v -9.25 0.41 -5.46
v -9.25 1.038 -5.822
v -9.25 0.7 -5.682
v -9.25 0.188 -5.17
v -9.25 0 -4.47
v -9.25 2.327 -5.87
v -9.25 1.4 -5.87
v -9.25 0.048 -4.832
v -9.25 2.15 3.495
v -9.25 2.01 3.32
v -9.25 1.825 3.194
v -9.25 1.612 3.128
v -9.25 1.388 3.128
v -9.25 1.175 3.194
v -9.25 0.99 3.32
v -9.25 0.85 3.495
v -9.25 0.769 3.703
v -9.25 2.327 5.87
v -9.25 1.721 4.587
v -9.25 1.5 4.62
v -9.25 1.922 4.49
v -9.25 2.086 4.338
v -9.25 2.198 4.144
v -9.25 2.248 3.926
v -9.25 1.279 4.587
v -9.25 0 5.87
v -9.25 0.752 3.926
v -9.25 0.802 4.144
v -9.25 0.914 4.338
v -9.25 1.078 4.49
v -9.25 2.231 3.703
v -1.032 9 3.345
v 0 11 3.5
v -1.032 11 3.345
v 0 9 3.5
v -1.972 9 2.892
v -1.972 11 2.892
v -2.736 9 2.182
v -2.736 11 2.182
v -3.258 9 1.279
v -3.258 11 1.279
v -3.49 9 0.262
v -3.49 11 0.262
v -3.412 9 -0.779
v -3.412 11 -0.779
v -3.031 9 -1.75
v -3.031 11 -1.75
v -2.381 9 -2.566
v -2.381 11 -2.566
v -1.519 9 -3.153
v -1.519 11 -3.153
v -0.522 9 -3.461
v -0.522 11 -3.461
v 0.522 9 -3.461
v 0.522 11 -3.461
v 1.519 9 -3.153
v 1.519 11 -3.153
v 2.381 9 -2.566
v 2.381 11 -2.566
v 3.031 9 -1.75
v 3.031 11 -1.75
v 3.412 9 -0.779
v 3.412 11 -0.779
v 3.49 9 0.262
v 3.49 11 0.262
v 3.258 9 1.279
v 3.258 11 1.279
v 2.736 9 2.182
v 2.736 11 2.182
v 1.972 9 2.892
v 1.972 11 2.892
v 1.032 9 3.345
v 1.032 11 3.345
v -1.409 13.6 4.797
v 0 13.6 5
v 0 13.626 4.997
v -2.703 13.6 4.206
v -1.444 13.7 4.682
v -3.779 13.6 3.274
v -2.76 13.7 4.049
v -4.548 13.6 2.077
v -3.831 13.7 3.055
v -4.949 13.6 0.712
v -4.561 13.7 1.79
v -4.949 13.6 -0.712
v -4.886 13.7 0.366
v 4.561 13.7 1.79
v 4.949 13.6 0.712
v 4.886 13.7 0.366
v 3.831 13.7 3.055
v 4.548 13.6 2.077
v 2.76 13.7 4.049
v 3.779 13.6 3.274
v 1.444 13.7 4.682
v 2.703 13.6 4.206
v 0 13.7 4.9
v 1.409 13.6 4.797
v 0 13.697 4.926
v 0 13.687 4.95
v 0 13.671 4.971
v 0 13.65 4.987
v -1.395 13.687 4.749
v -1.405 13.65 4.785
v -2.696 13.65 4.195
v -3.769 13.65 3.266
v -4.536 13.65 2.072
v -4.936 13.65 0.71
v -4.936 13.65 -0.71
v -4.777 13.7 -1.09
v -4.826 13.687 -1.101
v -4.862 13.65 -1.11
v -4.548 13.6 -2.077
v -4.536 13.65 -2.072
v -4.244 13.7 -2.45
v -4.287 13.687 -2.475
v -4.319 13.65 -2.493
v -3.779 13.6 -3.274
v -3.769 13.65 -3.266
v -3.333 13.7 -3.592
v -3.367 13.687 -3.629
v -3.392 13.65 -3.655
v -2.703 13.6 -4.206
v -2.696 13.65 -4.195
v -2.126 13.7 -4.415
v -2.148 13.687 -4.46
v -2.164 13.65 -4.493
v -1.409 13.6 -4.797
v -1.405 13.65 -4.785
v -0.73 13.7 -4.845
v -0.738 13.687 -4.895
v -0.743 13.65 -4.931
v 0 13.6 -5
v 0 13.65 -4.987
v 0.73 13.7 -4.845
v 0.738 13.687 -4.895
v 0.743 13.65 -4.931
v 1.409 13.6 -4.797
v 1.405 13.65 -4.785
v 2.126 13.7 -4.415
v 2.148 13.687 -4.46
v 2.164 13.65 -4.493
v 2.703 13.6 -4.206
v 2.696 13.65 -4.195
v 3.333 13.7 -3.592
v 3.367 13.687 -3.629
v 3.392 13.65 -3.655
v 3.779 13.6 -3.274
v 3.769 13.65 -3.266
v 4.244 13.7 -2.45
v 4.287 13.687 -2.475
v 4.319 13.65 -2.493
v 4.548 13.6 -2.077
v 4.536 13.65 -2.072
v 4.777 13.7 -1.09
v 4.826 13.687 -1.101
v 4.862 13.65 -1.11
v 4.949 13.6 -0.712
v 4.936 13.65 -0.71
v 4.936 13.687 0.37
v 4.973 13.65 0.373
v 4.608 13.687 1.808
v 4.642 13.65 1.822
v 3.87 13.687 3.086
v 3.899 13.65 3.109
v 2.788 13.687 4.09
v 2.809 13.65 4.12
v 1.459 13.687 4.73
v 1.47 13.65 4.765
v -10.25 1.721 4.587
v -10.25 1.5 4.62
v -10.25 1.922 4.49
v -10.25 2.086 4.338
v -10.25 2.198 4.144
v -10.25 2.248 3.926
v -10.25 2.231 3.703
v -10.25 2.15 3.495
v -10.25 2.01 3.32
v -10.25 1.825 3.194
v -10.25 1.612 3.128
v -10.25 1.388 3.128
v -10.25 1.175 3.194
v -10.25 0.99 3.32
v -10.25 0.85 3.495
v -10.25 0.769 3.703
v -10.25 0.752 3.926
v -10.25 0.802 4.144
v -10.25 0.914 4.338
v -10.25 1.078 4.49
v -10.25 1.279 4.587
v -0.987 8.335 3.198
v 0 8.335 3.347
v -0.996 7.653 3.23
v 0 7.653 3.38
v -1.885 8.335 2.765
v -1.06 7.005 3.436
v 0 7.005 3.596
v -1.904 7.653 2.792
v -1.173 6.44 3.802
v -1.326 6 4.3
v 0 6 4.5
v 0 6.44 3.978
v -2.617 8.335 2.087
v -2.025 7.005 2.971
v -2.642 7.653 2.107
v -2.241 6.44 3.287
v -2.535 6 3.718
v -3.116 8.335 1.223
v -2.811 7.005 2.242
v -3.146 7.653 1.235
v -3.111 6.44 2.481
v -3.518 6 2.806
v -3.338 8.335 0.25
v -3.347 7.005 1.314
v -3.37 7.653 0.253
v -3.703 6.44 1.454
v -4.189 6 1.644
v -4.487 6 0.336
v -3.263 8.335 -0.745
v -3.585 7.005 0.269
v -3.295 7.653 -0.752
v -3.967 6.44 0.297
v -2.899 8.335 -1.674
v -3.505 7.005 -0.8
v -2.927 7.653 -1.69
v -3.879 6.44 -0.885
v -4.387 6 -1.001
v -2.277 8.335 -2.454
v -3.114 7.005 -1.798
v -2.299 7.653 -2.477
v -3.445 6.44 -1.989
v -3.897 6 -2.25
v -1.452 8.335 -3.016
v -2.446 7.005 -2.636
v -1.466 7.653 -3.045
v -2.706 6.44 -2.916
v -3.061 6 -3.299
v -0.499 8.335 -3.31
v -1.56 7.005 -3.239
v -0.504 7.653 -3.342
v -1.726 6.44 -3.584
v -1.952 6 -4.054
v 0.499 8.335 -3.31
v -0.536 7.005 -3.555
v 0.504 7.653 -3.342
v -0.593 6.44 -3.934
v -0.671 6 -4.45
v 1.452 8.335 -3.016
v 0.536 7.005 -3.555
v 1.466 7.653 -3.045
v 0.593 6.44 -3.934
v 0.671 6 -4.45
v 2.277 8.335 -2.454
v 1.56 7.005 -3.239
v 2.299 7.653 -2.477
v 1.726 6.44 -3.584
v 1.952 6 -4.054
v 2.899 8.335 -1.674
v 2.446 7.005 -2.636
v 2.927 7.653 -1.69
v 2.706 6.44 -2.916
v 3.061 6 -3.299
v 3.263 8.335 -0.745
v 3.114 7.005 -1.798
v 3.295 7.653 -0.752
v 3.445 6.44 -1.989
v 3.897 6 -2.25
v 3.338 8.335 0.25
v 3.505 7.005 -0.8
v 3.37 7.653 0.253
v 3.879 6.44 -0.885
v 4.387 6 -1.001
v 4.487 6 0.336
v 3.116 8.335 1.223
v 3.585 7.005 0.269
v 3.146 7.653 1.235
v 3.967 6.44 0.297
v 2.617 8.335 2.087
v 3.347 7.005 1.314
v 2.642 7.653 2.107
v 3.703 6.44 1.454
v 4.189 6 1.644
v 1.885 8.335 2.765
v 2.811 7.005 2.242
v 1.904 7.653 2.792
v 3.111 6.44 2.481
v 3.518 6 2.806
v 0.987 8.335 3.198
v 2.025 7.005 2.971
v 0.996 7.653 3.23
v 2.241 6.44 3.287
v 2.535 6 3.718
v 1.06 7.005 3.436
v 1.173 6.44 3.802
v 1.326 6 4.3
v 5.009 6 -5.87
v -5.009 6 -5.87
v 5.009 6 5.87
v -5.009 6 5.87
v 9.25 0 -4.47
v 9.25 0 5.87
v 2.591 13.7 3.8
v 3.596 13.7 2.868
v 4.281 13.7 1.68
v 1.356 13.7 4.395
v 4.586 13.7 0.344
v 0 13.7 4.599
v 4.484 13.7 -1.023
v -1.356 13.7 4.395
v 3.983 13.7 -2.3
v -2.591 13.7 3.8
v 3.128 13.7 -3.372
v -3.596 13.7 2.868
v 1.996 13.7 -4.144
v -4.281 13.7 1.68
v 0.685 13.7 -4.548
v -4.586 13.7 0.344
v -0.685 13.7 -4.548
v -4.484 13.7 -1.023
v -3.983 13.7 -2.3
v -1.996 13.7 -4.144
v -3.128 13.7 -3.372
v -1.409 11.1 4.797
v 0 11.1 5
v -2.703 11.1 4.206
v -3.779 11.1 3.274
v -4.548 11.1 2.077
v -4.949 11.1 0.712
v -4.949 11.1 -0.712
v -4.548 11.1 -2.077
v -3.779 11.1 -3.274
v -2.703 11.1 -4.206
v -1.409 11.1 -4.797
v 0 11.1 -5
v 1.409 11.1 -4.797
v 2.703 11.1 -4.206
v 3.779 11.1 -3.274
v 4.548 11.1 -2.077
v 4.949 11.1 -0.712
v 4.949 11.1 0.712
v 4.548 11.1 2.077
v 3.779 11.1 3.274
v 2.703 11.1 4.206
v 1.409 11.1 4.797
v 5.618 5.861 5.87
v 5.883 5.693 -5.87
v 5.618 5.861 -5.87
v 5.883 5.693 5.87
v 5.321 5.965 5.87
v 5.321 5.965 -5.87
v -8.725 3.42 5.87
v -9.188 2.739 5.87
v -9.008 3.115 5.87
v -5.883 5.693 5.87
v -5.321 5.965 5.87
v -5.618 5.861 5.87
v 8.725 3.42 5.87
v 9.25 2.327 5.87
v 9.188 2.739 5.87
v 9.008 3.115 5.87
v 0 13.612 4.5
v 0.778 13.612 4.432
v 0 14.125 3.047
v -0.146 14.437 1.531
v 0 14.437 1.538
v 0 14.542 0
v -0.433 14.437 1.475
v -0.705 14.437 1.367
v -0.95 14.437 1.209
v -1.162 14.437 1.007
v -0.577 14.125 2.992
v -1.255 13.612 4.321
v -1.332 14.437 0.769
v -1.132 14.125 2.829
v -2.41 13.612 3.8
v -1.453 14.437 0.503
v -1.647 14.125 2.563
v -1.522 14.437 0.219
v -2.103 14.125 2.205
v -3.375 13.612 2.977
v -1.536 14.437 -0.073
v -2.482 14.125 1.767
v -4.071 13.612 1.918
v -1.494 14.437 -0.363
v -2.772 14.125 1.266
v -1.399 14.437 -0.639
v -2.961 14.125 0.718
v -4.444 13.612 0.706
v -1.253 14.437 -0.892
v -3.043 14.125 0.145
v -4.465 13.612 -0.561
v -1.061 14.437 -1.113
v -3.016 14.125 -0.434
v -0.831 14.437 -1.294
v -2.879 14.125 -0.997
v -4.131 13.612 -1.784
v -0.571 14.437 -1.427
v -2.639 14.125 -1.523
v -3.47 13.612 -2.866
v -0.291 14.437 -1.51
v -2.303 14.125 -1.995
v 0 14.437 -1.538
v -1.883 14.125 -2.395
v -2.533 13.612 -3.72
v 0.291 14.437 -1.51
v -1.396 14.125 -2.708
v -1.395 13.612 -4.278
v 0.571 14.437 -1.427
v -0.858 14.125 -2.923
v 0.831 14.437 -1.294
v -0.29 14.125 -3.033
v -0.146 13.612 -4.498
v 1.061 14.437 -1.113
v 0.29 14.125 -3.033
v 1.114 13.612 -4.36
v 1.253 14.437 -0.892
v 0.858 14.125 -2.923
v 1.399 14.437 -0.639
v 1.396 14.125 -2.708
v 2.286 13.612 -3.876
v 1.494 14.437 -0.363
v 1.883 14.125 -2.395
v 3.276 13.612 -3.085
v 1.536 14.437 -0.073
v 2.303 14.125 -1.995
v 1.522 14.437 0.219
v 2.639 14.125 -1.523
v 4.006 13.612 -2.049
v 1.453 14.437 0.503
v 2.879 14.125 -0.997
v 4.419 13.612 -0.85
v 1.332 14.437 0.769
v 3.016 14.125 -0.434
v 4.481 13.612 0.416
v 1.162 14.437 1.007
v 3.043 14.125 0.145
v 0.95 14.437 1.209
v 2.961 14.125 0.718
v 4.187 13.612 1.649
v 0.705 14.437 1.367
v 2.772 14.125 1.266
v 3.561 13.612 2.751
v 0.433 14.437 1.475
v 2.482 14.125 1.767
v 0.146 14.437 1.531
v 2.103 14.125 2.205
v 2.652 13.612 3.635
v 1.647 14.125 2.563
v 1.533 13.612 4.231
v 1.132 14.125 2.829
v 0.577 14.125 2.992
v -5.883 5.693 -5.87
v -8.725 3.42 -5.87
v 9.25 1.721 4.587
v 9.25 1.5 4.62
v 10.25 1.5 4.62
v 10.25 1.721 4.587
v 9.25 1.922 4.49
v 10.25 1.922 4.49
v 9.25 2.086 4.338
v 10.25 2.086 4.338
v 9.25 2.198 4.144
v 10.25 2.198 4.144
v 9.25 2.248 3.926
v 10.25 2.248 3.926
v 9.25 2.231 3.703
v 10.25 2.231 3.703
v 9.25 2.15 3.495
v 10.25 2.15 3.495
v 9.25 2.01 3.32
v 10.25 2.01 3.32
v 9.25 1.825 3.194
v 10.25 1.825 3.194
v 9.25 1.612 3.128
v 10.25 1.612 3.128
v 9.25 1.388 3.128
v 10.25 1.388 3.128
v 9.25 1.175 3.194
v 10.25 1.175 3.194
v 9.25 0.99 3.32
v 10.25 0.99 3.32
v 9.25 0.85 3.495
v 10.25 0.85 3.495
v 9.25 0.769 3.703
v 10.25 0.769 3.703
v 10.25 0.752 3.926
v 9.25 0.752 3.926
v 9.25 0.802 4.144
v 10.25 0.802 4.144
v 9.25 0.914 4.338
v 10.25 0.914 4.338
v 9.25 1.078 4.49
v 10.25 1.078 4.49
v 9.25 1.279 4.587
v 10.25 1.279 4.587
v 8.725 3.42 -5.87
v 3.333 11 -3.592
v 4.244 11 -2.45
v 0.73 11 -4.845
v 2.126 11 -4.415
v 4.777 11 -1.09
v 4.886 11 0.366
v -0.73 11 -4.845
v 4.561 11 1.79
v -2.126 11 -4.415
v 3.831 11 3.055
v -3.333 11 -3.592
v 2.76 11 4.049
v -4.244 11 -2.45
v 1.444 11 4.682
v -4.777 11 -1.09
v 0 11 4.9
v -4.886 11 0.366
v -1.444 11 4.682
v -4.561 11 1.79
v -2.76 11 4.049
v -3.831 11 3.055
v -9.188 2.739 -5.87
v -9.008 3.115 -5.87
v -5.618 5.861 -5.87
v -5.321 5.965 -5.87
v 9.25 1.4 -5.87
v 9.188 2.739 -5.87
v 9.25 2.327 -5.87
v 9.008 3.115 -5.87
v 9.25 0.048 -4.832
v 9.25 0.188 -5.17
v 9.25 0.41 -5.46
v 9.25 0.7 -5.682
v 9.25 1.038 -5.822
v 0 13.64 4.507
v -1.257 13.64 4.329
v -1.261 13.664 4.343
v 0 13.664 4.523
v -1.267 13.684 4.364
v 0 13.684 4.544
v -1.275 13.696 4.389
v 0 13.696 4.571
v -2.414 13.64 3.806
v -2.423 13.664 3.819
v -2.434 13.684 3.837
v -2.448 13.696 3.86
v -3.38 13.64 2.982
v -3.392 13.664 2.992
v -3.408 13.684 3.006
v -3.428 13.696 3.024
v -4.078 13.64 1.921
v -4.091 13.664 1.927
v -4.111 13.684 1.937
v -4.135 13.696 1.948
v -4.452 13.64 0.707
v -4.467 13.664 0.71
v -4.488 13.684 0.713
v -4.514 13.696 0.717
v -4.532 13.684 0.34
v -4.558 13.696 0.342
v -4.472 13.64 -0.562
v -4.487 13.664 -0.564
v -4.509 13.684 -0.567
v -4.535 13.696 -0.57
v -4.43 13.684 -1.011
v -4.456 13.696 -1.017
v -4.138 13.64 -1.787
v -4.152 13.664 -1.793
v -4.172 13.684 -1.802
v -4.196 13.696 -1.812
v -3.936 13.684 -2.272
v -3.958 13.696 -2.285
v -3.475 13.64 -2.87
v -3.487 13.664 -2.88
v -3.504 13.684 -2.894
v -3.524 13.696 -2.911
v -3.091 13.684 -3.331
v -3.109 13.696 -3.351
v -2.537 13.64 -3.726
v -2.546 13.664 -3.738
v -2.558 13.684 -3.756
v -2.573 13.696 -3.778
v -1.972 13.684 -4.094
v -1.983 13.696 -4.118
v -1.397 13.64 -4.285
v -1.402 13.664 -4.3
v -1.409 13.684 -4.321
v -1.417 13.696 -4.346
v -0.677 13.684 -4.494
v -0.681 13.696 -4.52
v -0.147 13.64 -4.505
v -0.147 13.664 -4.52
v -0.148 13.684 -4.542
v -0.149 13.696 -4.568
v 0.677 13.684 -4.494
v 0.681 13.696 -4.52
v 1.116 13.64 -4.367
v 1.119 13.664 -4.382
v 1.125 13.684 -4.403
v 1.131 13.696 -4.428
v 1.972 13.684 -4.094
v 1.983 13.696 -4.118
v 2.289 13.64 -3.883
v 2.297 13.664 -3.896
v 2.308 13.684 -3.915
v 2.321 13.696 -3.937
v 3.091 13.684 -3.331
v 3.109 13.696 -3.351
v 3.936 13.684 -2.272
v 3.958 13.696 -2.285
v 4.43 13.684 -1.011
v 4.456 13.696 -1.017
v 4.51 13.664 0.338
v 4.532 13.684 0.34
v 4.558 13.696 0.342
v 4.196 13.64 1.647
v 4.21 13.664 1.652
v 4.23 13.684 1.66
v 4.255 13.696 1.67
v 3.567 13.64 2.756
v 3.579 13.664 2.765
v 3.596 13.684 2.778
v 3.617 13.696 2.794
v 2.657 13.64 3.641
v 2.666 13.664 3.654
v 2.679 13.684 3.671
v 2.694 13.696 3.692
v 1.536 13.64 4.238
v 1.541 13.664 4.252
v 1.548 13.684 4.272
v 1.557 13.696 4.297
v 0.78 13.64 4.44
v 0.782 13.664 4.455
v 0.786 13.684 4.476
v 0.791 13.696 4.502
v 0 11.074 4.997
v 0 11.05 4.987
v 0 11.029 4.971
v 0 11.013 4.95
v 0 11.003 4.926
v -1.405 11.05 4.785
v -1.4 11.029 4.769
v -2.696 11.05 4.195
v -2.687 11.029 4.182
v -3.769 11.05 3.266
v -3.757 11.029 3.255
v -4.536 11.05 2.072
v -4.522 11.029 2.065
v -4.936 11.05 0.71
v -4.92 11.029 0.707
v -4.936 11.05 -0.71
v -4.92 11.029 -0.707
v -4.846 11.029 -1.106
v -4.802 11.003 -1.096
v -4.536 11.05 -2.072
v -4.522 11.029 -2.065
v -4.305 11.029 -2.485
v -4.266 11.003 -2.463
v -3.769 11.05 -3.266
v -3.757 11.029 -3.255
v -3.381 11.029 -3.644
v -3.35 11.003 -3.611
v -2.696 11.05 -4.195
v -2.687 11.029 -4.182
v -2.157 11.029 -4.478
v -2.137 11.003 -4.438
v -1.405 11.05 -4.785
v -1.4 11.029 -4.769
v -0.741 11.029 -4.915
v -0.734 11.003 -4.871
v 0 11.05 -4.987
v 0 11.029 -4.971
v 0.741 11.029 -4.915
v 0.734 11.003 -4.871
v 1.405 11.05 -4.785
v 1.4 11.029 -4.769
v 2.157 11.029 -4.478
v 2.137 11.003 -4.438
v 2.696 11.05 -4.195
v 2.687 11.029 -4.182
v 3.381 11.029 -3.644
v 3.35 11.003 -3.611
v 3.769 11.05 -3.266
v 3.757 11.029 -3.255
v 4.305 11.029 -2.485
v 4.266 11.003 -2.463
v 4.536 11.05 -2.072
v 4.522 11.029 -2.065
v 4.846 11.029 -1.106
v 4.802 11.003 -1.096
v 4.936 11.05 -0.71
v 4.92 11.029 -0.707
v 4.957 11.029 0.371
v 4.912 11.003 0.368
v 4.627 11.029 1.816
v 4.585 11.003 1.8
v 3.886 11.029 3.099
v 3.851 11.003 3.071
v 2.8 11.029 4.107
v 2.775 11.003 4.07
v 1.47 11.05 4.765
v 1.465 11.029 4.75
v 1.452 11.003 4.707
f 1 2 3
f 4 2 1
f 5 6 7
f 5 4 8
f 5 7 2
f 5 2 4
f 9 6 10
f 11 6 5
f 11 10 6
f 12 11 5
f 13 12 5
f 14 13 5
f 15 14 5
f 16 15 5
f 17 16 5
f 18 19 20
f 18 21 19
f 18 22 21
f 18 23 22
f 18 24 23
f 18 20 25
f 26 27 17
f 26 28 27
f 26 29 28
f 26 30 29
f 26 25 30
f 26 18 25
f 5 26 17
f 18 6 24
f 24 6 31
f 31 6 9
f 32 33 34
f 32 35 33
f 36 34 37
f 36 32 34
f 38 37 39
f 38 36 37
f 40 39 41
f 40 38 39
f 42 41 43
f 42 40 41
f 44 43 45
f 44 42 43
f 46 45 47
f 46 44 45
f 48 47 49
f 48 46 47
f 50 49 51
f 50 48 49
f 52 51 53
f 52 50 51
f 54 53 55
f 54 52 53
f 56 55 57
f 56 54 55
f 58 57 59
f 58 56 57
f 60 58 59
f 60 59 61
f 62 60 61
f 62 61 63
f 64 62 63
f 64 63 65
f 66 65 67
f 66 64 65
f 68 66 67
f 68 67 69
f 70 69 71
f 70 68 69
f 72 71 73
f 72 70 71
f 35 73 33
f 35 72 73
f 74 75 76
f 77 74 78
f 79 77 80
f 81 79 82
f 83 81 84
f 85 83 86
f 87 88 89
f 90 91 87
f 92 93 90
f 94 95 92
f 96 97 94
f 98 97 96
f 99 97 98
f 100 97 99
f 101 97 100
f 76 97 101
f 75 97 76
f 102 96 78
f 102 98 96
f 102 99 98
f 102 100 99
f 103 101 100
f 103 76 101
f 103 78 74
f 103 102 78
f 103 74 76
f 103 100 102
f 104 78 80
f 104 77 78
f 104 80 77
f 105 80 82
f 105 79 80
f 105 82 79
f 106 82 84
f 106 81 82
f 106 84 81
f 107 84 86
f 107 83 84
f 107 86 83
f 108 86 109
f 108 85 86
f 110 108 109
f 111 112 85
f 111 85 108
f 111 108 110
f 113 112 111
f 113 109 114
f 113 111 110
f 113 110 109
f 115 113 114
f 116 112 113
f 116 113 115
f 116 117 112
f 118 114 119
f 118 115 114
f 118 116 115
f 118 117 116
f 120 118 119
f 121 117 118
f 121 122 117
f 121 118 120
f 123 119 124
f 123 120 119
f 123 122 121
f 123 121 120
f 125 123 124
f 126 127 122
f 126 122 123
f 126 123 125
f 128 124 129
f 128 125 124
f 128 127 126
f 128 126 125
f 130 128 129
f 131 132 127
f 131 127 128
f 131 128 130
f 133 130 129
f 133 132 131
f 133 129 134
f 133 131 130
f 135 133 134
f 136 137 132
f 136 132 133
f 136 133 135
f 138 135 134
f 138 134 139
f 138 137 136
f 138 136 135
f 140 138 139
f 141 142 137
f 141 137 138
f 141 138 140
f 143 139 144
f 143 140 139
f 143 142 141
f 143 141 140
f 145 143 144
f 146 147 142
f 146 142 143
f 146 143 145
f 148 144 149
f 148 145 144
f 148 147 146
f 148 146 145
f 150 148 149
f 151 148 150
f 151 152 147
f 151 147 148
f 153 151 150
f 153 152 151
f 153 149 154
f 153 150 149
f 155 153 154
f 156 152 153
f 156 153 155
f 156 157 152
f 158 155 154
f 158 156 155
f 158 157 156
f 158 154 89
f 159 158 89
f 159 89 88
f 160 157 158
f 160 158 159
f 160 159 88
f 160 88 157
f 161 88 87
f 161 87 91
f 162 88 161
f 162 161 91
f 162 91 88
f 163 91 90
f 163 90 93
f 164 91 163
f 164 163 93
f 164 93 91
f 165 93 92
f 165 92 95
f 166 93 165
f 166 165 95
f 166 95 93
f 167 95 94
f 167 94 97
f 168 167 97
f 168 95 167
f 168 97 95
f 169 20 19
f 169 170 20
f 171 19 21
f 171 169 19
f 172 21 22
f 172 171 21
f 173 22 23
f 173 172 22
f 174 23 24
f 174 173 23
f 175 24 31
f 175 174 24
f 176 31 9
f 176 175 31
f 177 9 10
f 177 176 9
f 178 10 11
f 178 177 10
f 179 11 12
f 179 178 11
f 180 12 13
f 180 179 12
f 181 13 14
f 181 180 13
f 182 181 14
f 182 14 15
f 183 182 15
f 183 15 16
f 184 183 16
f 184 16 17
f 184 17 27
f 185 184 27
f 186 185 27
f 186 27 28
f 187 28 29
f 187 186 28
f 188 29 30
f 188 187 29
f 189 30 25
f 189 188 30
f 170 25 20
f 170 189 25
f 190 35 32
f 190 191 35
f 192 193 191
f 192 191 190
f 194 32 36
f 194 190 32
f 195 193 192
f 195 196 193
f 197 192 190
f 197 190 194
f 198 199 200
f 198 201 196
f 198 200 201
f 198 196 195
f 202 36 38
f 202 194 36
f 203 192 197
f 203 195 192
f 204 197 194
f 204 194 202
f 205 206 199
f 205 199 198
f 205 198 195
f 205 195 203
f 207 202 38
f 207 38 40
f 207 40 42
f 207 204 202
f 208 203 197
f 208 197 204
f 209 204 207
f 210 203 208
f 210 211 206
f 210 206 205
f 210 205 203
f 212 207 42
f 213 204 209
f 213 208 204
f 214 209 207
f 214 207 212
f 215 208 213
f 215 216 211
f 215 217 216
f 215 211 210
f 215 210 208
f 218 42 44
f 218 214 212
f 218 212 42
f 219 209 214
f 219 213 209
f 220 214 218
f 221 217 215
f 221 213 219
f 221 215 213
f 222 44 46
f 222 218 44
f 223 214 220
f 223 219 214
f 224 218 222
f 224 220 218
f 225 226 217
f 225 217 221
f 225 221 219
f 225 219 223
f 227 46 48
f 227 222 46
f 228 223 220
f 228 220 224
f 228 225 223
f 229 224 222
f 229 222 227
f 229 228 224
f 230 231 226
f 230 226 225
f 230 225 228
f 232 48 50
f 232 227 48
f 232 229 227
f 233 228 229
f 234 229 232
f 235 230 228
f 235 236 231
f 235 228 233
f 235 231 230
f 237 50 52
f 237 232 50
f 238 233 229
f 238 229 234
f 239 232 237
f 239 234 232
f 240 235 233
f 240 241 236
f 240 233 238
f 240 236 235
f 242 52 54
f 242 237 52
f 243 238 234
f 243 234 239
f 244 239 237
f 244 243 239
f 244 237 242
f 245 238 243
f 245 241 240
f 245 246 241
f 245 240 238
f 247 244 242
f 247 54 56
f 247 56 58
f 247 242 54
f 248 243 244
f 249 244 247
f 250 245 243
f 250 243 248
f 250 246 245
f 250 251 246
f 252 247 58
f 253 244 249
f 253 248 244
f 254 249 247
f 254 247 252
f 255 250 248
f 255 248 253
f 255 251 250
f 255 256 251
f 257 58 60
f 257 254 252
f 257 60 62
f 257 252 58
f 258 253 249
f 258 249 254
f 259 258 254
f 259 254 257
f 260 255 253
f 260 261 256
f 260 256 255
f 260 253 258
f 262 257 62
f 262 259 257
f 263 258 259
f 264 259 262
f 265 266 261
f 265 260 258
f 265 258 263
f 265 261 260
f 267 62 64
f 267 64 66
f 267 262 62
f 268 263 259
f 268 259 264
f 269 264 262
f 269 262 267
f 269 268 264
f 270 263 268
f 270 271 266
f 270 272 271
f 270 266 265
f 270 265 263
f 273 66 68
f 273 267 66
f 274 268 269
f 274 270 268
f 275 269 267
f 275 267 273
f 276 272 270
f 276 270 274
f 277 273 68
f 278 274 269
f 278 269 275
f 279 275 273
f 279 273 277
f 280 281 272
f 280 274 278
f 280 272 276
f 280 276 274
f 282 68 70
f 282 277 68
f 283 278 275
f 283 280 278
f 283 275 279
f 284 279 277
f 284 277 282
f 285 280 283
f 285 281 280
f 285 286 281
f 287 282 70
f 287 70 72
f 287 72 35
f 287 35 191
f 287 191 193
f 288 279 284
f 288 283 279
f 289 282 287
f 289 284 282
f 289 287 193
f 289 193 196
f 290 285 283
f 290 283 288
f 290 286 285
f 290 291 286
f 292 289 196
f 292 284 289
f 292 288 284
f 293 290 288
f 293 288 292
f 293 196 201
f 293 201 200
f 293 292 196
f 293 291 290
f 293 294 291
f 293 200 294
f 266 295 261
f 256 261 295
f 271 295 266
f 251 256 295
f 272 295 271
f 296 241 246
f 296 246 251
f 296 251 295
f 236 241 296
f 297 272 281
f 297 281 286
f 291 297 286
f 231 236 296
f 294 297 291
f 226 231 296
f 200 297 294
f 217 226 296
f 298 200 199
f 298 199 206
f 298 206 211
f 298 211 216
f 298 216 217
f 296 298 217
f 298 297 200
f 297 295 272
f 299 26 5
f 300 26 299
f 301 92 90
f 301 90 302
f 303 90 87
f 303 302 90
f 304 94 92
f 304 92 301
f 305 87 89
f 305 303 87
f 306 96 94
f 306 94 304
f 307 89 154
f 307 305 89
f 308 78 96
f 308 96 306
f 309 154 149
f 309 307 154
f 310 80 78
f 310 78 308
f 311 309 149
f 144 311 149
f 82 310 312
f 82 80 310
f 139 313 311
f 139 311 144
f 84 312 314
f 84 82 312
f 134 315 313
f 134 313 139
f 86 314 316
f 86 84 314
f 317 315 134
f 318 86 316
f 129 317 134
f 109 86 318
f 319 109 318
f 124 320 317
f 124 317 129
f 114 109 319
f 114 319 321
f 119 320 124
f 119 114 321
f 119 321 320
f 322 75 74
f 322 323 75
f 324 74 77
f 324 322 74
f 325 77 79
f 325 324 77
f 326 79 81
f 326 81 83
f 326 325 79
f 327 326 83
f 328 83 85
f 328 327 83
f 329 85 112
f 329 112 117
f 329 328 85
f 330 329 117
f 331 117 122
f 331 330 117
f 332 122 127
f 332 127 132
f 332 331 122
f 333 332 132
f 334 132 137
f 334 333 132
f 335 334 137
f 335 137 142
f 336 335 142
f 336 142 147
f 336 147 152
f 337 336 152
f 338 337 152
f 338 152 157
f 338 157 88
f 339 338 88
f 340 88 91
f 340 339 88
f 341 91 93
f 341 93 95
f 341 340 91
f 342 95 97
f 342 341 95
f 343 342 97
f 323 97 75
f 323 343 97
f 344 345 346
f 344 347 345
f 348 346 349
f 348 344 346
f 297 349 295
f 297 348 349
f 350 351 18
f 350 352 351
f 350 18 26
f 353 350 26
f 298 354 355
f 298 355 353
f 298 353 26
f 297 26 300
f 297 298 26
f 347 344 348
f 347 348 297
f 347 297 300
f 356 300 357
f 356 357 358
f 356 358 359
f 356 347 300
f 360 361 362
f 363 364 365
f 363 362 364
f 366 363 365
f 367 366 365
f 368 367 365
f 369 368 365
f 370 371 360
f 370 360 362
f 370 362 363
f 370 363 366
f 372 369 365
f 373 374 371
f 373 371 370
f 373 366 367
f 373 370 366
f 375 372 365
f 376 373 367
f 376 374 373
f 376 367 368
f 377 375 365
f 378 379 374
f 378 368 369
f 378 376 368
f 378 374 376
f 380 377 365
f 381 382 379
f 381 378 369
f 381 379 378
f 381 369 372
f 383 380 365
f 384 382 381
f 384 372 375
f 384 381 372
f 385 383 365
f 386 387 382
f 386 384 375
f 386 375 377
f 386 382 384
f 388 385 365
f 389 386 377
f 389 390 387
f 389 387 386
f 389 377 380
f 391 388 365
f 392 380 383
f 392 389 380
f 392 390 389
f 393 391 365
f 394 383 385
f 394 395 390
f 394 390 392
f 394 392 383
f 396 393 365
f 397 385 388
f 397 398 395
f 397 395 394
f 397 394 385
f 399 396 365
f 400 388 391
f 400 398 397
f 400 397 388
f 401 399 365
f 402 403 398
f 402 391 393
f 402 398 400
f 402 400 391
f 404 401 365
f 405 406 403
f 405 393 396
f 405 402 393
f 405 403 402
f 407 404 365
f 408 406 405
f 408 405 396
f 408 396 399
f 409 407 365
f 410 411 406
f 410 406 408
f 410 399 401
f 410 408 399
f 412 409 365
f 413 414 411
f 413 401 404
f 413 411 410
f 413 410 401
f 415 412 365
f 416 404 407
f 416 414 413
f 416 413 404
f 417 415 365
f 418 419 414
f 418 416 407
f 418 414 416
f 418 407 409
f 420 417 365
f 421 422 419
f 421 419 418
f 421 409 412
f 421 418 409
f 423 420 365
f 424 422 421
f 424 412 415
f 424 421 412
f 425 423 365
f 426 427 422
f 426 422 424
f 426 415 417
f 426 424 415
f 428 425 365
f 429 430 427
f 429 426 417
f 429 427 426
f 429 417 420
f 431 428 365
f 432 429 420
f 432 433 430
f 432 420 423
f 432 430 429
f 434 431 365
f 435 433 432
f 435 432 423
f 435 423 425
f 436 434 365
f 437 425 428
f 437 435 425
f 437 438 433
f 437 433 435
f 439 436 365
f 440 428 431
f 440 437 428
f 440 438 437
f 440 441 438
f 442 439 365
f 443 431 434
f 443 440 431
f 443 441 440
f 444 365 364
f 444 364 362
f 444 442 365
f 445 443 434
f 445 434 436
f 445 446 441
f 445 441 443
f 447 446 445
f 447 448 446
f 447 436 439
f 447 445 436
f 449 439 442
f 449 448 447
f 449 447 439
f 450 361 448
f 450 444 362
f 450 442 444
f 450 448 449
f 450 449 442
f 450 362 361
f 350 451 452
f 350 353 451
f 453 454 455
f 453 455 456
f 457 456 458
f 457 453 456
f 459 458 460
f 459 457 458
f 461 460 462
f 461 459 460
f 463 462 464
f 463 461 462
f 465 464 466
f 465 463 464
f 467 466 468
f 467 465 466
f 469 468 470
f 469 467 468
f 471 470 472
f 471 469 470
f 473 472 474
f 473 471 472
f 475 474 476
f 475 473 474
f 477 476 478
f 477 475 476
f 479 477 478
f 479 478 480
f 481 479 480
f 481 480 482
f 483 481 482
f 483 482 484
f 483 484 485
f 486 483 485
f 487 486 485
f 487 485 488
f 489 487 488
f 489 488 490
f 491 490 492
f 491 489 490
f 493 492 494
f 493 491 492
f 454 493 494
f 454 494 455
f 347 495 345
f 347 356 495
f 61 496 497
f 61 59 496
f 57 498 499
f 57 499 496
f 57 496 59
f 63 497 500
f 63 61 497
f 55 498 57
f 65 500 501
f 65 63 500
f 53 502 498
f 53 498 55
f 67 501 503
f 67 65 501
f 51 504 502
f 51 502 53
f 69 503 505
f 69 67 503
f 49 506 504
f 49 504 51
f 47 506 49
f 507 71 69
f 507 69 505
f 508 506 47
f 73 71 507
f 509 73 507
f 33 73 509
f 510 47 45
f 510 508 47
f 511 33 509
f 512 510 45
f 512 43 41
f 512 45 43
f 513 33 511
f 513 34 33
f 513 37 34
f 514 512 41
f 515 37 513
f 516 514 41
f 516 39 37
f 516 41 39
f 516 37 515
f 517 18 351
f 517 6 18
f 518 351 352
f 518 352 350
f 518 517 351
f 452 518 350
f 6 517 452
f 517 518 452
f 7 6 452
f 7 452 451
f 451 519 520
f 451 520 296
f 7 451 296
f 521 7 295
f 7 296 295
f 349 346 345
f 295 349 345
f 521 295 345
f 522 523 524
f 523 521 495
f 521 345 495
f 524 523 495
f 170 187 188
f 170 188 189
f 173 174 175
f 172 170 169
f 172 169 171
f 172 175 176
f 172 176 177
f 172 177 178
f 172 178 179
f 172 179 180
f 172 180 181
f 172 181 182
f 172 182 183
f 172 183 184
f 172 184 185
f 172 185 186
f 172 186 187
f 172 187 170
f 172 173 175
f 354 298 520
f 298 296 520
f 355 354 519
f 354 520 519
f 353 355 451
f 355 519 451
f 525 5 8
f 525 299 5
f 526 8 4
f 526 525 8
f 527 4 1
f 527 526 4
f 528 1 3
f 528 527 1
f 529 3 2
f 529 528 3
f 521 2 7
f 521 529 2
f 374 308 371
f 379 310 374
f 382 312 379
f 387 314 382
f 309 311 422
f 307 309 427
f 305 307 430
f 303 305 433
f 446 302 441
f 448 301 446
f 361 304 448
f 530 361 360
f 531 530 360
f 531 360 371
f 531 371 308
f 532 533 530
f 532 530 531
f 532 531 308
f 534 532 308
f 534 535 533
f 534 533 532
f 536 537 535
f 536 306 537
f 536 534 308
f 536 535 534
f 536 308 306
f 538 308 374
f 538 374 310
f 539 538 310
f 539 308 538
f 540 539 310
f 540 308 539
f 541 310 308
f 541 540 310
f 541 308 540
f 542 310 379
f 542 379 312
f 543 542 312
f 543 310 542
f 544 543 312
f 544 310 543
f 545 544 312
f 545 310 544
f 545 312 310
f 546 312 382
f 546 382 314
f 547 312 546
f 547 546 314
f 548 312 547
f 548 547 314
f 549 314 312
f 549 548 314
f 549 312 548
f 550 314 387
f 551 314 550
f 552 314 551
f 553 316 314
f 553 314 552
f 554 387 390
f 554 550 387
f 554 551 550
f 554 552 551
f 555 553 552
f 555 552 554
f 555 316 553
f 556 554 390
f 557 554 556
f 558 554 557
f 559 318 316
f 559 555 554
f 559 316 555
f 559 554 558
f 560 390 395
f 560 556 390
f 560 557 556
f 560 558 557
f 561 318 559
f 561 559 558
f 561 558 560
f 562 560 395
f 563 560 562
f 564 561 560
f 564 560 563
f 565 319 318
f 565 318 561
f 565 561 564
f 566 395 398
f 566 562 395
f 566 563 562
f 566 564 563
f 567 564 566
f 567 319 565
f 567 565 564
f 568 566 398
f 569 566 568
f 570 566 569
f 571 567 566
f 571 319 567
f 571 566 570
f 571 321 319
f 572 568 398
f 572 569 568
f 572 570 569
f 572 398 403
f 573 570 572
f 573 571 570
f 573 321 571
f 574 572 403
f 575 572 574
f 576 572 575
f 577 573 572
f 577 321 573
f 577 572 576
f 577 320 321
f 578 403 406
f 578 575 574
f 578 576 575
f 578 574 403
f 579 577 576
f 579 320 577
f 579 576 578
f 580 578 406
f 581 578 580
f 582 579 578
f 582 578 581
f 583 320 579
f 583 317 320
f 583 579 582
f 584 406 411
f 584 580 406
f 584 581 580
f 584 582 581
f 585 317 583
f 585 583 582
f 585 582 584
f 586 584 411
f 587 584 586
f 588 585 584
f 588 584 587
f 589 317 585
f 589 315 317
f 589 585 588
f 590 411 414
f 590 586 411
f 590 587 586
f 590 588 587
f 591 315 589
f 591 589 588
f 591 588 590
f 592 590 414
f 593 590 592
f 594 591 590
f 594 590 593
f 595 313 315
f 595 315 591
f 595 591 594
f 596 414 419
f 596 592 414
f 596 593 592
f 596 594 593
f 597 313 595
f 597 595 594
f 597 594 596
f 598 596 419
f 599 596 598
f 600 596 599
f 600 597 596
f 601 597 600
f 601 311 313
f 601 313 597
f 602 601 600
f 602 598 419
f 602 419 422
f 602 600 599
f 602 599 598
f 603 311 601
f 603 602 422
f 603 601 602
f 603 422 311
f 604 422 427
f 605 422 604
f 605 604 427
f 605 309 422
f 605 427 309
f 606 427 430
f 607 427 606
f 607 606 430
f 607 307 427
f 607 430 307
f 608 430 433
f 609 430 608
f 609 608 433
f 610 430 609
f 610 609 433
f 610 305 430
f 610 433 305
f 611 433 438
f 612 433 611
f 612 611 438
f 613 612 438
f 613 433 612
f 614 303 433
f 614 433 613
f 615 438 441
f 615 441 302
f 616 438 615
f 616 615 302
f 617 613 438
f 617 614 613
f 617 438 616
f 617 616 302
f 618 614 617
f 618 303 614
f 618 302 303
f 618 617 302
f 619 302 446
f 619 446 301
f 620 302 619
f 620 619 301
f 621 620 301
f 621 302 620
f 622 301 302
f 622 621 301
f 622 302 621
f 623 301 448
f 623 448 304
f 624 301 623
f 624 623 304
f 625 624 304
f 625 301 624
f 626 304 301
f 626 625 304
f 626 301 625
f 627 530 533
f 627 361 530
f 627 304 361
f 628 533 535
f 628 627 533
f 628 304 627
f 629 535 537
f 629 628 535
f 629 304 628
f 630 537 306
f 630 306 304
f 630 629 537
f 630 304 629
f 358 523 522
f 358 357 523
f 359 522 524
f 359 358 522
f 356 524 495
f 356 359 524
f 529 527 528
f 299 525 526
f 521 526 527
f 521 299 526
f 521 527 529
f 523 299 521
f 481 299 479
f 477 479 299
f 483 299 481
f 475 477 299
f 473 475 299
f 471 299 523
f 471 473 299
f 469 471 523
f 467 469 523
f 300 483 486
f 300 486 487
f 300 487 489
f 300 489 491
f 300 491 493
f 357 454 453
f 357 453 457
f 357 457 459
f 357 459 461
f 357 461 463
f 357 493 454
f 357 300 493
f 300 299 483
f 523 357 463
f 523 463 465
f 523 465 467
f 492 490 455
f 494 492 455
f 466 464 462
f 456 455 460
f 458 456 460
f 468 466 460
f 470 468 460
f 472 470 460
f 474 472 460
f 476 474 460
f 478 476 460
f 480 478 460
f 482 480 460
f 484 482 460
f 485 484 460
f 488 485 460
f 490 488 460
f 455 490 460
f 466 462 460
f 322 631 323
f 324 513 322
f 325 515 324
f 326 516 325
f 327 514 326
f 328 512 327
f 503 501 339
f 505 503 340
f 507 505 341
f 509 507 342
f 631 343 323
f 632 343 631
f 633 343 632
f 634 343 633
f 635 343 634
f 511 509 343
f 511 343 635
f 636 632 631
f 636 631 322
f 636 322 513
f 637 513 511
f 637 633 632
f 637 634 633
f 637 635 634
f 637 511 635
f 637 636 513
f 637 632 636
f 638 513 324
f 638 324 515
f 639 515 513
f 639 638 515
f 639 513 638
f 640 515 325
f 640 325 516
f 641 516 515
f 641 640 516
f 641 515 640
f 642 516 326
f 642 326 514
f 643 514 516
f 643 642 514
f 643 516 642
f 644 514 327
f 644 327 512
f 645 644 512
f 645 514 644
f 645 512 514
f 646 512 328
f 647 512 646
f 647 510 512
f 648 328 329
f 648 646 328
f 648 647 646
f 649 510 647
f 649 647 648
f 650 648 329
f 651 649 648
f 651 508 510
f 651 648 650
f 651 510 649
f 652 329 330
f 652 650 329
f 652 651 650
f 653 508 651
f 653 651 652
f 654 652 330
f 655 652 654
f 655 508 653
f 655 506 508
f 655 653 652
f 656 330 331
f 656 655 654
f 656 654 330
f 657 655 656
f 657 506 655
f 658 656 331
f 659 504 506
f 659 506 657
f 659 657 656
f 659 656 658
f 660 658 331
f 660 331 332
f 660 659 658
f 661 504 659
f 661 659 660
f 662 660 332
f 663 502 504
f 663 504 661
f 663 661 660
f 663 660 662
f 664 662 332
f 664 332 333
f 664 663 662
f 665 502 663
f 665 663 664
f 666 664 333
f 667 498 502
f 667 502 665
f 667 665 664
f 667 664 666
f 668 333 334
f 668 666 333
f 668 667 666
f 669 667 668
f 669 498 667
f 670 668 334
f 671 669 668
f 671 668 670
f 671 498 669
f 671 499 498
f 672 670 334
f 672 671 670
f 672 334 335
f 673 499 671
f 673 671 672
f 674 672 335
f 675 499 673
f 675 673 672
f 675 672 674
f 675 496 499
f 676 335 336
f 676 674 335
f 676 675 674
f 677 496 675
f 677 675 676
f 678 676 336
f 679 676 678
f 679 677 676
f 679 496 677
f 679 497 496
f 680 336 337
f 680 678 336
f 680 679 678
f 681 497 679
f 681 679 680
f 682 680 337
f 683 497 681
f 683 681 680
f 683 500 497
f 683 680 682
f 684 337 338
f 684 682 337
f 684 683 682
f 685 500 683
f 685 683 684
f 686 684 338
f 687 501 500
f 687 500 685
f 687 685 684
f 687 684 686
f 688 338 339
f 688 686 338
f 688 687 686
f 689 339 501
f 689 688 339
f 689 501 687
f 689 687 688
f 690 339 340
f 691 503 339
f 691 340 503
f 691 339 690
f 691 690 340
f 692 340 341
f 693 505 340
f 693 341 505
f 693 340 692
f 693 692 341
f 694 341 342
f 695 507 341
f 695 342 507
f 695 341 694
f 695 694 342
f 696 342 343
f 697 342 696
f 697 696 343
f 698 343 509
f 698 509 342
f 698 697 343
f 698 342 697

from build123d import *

# Parameters (mm, degrees)
BOSS_EXTRUDE1_DEPTH = 5.87
SKETCH6_R           = 0.75
BOSS_EXTRUDE2_DEPTH = 10.25
FILLET1_R           = 0.1
FILLET2_R           = 1.4
FILLET3_R           = 1.4


with BuildPart() as part:
    # Sketch1 → Boss-Extrude1 (new, symmetric)
    with BuildSketch(Plane.XY):
        Polygon((-9.25, 0), (9.25, 0), (9.25, 3), (5.5, 6), (-5.5, 6), (-9.25, 3), align=None)
    extrude(amount=BOSS_EXTRUDE1_DEPTH, both=True)

    # Sketch2 → Revolve5 (revolve)
    with BuildSketch(Plane.XY, mode=Mode.PRIVATE) as revolve5_sk:
        with BuildLine():
            ThreePointArc((3.5, 9), (3.465409062, 7.321803021), (4.5, 6))
            Line((4.5, 6), (0, 6))
            Line((0, 6), (0, 13.5))
            Line((0, 13.5), (4.5, 13.5))
            Line((4.5, 13.5), (4.5, 13.7))
            Line((4.5, 13.7), (5, 13.7))
            Line((5, 13.7), (5, 11))
            Line((5, 11), (3.5, 11))
            Line((3.5, 11), (3.5, 9))
        make_face()
    revolve(revolve5_sk.sketch.rotate(Axis((0, 13.5, 0), (0, -1, 0)), 90), axis=Axis((0, 13.5, 0), (0, -1, 0)))

    # Sketch3 → Revolve6 (revolve)
    with BuildSketch(Plane.XY, mode=Mode.PRIVATE) as revolve6_sk:
        with BuildLine():
            Line((0, 13.5), (0, 14.541750876))
            ThreePointArc((0, 14.541750876), (2.431447351, 14.278254553), (4.75, 13.5))
            Line((4.75, 13.5), (0, 13.5))
        make_face()
    revolve(revolve6_sk.sketch.rotate(Axis((0, 20.298095722, 0), (0, -1, 0)), 90), axis=Axis((0, 20.298095722, 0), (0, -1, 0)))

    # Sketch6 → Boss-Extrude2 (add, symmetric)
    with BuildSketch(Plane.ZY):
        with Locations((3.87, 1.5)):
            Circle(SKETCH6_R)
    extrude(amount=BOSS_EXTRUDE2_DEPTH, both=True)

    # Fillet1
    # the kernel refuses this fillet: 0.1 mm, written as the material it takes off along each edge
    with BuildSketch(Plane(origin=(0, 11, 0), x_dir=(0, 0, 1), z_dir=(1, 0, 0))) as fillet1_piece_1:
        with BuildLine():
            CenterArc((5 - FILLET1_R, -FILLET1_R), FILLET1_R, 0, 90)
            Line((5, -FILLET1_R), (5, 0))
            Line((5, 0), (5 - FILLET1_R, 0))
        make_face()
    revolve(axis=Axis((0, 11, 0), (0, -1, 0)), mode=Mode.SUBTRACT)
    with BuildSketch(Plane(origin=(0, 13.7, 0), x_dir=(0, 0, 1), z_dir=(1, 0, 0))) as fillet1_piece_2:
        with BuildLine():
            CenterArc((5 - FILLET1_R, FILLET1_R), FILLET1_R, 270, 90)
            Line((5 - FILLET1_R, 0), (5, 0))
            Line((5, 0), (5, FILLET1_R))
        make_face()
    revolve(axis=Axis((0, 13.7, 0), (0, -1, 0)), mode=Mode.SUBTRACT)
    with BuildSketch(Plane(origin=(0, 13.7, 0), x_dir=(0, 0, 1), z_dir=(1, 0, 0))) as fillet1_piece_3:
        with BuildLine():
            CenterArc((4.59932915, 0.1), FILLET1_R, 186.640387385, 83.359612615)
            Line((4.5, 0.088436266), (4.5, 0))
            Line((4.5, 0), (4.59932915, 0))
        make_face()
    revolve(axis=Axis((0, 13.7, 0), (0, -1, 0)), mode=Mode.SUBTRACT)

    # Fillet2
    fillet2_edges = [part.edges().sort_by_distance(p)[0] for p in [
        (-9.25, 3, 0),
        (-5.5, 6, 0),
        (9.25, 3, 0),
        (0, 0, -5.87),
    ]]
    fillet(fillet2_edges, radius=FILLET2_R)

    # Fillet3
    fillet3_edges = [part.edges().sort_by_distance(p)[0] for p in [
        (5.5, 6, 0),
    ]]
    fillet(fillet3_edges, radius=FILLET3_R)


solid = part.part
